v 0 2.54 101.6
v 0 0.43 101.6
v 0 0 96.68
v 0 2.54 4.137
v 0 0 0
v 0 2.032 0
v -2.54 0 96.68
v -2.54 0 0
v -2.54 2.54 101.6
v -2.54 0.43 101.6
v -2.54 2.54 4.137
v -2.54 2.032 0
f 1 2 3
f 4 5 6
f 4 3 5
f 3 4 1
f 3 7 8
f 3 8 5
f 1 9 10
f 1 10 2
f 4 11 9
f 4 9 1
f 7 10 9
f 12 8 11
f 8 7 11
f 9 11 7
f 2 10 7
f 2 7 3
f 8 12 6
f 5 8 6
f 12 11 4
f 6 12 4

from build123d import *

# Parameters (mm, degrees)
SKETCH1_W           = 2.54
SKETCH1_H           = 2.54
BOSS_EXTRUDE1_DEPTH = 101.6
CHAMFER1_SIZE       = 4.92
CHAMFER1_SIZE2      = 0.430444225
CHAMFER2_SIZE       = 0.508
CHAMFER2_SIZE2      = 4.137327985


with BuildPart() as part:
    # Sketch1 → Boss-Extrude1 (new body)
    with BuildSketch(Plane.XY):
        with Locations((-1.27, 1.27)):
            Rectangle(SKETCH1_W, SKETCH1_H)
    extrude(amount=BOSS_EXTRUDE1_DEPTH)

    # Chamfer1
    chamfer1_edges = [part.edges().sort_by_distance(p)[0] for p in [
        (-1.27, 0, 101.6),
    ]]
    chamfer1_side = [part.faces().sort_by_distance(p)[0] for p in [
        (-1.27, 0, 50.8),
    ]]
    chamfer(chamfer1_edges, length=CHAMFER1_SIZE, length2=CHAMFER1_SIZE2, reference=chamfer1_side[0])

    # Chamfer2
    chamfer2_edges = [part.edges().sort_by_distance(p)[0] for p in [
        (-1.27, 2.54, 0),
    ]]
    chamfer2_side = [part.faces().sort_by_distance(p)[0] for p in [
        (-1.27, 1.27, 0),
    ]]
    chamfer(chamfer2_edges, length=CHAMFER2_SIZE, length2=CHAMFER2_SIZE2, reference=chamfer2_side[0])


solid = part.part
